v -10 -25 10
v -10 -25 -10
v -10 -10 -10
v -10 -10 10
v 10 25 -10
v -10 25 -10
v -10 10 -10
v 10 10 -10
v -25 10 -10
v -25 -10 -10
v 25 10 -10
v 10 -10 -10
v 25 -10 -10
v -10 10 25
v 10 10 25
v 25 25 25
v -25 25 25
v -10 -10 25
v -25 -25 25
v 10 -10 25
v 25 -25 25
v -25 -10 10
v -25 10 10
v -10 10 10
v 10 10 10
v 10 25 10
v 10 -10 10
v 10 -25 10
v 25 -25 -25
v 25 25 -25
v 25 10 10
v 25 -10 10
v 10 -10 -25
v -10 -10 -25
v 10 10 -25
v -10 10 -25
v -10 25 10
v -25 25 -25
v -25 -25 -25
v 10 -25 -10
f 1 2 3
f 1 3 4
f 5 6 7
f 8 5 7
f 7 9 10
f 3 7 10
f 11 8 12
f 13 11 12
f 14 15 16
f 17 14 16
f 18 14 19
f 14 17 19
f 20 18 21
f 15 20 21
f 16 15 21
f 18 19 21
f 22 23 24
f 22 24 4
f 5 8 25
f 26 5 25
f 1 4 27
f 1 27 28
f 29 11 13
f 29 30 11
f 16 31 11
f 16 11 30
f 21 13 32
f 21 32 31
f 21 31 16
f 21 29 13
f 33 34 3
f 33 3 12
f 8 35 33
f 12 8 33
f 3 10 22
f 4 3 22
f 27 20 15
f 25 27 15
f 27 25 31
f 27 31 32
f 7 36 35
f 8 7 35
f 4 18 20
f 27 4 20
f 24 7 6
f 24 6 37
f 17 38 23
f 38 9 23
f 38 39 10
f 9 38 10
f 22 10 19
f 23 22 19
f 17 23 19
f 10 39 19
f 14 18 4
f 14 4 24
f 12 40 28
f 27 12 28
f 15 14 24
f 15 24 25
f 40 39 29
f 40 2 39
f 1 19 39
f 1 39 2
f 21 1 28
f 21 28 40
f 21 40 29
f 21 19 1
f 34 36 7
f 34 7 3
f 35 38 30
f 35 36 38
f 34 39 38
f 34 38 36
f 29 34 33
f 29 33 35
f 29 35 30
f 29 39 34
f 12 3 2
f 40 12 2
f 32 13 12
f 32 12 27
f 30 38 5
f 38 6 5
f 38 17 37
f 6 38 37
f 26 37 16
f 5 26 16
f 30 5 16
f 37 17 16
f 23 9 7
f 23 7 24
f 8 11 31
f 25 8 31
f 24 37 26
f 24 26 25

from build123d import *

# Parameters (mm, degrees)
F0_W      = 50
F0_H      = 50
F1_DEPTH  = 25
F2_W      = 20
F2_H      = 20
F3_DEPTH  = 50
F4_W      = 20
F4_H      = 20
F5_DEPTH  = 15
F6_W      = 20
F6_H      = 20
F7_DEPTH  = 15
F8_W      = 20
F8_H      = 20
F9_DEPTH  = 15
F10_W     = 20
F10_H     = 20
F11_DEPTH = 15


with BuildPart() as f1:
    # F0 (on Front) → F1 (new body, symmetric)
    with BuildSketch(Plane.XZ):
        Rectangle(F0_W, F0_H)
    extrude(amount=F1_DEPTH, both=True)

    # F2 (on face) → F3 (cut, through all)
    with BuildSketch(Plane.XZ.offset(25)):
        Rectangle(F2_W, F2_H)
    extrude(amount=-F3_DEPTH, mode=Mode.SUBTRACT)

    # F4 (on face) → F5 (cut, through all)
    with BuildSketch(Plane(origin=(-25, 0, 0), x_dir=(0, -1, 0), z_dir=(-1, 0, 0))):
        Rectangle(F4_W, F4_H)
    extrude(amount=-F5_DEPTH, mode=Mode.SUBTRACT)

    # F6 (on face) → F7 (cut, through all)
    with BuildSketch(Plane.YZ.offset(25)):
        Rectangle(F6_W, F6_H)
    extrude(amount=-F7_DEPTH, mode=Mode.SUBTRACT)

    # F8 (on face) → F9 (cut, through all)
    with BuildSketch(Plane.XY.offset(25)):
        Rectangle(F8_W, F8_H)
    extrude(amount=-F9_DEPTH, mode=Mode.SUBTRACT)

    # F10 (on face) → F11 (cut, through all)
    with BuildSketch(Plane(origin=(0, 0, -25), x_dir=(1, 0, 0), z_dir=(0, 0, -1))):
        Rectangle(F10_W, F10_H)
    extrude(amount=-F11_DEPTH, mode=Mode.SUBTRACT)


solid = f1.part
